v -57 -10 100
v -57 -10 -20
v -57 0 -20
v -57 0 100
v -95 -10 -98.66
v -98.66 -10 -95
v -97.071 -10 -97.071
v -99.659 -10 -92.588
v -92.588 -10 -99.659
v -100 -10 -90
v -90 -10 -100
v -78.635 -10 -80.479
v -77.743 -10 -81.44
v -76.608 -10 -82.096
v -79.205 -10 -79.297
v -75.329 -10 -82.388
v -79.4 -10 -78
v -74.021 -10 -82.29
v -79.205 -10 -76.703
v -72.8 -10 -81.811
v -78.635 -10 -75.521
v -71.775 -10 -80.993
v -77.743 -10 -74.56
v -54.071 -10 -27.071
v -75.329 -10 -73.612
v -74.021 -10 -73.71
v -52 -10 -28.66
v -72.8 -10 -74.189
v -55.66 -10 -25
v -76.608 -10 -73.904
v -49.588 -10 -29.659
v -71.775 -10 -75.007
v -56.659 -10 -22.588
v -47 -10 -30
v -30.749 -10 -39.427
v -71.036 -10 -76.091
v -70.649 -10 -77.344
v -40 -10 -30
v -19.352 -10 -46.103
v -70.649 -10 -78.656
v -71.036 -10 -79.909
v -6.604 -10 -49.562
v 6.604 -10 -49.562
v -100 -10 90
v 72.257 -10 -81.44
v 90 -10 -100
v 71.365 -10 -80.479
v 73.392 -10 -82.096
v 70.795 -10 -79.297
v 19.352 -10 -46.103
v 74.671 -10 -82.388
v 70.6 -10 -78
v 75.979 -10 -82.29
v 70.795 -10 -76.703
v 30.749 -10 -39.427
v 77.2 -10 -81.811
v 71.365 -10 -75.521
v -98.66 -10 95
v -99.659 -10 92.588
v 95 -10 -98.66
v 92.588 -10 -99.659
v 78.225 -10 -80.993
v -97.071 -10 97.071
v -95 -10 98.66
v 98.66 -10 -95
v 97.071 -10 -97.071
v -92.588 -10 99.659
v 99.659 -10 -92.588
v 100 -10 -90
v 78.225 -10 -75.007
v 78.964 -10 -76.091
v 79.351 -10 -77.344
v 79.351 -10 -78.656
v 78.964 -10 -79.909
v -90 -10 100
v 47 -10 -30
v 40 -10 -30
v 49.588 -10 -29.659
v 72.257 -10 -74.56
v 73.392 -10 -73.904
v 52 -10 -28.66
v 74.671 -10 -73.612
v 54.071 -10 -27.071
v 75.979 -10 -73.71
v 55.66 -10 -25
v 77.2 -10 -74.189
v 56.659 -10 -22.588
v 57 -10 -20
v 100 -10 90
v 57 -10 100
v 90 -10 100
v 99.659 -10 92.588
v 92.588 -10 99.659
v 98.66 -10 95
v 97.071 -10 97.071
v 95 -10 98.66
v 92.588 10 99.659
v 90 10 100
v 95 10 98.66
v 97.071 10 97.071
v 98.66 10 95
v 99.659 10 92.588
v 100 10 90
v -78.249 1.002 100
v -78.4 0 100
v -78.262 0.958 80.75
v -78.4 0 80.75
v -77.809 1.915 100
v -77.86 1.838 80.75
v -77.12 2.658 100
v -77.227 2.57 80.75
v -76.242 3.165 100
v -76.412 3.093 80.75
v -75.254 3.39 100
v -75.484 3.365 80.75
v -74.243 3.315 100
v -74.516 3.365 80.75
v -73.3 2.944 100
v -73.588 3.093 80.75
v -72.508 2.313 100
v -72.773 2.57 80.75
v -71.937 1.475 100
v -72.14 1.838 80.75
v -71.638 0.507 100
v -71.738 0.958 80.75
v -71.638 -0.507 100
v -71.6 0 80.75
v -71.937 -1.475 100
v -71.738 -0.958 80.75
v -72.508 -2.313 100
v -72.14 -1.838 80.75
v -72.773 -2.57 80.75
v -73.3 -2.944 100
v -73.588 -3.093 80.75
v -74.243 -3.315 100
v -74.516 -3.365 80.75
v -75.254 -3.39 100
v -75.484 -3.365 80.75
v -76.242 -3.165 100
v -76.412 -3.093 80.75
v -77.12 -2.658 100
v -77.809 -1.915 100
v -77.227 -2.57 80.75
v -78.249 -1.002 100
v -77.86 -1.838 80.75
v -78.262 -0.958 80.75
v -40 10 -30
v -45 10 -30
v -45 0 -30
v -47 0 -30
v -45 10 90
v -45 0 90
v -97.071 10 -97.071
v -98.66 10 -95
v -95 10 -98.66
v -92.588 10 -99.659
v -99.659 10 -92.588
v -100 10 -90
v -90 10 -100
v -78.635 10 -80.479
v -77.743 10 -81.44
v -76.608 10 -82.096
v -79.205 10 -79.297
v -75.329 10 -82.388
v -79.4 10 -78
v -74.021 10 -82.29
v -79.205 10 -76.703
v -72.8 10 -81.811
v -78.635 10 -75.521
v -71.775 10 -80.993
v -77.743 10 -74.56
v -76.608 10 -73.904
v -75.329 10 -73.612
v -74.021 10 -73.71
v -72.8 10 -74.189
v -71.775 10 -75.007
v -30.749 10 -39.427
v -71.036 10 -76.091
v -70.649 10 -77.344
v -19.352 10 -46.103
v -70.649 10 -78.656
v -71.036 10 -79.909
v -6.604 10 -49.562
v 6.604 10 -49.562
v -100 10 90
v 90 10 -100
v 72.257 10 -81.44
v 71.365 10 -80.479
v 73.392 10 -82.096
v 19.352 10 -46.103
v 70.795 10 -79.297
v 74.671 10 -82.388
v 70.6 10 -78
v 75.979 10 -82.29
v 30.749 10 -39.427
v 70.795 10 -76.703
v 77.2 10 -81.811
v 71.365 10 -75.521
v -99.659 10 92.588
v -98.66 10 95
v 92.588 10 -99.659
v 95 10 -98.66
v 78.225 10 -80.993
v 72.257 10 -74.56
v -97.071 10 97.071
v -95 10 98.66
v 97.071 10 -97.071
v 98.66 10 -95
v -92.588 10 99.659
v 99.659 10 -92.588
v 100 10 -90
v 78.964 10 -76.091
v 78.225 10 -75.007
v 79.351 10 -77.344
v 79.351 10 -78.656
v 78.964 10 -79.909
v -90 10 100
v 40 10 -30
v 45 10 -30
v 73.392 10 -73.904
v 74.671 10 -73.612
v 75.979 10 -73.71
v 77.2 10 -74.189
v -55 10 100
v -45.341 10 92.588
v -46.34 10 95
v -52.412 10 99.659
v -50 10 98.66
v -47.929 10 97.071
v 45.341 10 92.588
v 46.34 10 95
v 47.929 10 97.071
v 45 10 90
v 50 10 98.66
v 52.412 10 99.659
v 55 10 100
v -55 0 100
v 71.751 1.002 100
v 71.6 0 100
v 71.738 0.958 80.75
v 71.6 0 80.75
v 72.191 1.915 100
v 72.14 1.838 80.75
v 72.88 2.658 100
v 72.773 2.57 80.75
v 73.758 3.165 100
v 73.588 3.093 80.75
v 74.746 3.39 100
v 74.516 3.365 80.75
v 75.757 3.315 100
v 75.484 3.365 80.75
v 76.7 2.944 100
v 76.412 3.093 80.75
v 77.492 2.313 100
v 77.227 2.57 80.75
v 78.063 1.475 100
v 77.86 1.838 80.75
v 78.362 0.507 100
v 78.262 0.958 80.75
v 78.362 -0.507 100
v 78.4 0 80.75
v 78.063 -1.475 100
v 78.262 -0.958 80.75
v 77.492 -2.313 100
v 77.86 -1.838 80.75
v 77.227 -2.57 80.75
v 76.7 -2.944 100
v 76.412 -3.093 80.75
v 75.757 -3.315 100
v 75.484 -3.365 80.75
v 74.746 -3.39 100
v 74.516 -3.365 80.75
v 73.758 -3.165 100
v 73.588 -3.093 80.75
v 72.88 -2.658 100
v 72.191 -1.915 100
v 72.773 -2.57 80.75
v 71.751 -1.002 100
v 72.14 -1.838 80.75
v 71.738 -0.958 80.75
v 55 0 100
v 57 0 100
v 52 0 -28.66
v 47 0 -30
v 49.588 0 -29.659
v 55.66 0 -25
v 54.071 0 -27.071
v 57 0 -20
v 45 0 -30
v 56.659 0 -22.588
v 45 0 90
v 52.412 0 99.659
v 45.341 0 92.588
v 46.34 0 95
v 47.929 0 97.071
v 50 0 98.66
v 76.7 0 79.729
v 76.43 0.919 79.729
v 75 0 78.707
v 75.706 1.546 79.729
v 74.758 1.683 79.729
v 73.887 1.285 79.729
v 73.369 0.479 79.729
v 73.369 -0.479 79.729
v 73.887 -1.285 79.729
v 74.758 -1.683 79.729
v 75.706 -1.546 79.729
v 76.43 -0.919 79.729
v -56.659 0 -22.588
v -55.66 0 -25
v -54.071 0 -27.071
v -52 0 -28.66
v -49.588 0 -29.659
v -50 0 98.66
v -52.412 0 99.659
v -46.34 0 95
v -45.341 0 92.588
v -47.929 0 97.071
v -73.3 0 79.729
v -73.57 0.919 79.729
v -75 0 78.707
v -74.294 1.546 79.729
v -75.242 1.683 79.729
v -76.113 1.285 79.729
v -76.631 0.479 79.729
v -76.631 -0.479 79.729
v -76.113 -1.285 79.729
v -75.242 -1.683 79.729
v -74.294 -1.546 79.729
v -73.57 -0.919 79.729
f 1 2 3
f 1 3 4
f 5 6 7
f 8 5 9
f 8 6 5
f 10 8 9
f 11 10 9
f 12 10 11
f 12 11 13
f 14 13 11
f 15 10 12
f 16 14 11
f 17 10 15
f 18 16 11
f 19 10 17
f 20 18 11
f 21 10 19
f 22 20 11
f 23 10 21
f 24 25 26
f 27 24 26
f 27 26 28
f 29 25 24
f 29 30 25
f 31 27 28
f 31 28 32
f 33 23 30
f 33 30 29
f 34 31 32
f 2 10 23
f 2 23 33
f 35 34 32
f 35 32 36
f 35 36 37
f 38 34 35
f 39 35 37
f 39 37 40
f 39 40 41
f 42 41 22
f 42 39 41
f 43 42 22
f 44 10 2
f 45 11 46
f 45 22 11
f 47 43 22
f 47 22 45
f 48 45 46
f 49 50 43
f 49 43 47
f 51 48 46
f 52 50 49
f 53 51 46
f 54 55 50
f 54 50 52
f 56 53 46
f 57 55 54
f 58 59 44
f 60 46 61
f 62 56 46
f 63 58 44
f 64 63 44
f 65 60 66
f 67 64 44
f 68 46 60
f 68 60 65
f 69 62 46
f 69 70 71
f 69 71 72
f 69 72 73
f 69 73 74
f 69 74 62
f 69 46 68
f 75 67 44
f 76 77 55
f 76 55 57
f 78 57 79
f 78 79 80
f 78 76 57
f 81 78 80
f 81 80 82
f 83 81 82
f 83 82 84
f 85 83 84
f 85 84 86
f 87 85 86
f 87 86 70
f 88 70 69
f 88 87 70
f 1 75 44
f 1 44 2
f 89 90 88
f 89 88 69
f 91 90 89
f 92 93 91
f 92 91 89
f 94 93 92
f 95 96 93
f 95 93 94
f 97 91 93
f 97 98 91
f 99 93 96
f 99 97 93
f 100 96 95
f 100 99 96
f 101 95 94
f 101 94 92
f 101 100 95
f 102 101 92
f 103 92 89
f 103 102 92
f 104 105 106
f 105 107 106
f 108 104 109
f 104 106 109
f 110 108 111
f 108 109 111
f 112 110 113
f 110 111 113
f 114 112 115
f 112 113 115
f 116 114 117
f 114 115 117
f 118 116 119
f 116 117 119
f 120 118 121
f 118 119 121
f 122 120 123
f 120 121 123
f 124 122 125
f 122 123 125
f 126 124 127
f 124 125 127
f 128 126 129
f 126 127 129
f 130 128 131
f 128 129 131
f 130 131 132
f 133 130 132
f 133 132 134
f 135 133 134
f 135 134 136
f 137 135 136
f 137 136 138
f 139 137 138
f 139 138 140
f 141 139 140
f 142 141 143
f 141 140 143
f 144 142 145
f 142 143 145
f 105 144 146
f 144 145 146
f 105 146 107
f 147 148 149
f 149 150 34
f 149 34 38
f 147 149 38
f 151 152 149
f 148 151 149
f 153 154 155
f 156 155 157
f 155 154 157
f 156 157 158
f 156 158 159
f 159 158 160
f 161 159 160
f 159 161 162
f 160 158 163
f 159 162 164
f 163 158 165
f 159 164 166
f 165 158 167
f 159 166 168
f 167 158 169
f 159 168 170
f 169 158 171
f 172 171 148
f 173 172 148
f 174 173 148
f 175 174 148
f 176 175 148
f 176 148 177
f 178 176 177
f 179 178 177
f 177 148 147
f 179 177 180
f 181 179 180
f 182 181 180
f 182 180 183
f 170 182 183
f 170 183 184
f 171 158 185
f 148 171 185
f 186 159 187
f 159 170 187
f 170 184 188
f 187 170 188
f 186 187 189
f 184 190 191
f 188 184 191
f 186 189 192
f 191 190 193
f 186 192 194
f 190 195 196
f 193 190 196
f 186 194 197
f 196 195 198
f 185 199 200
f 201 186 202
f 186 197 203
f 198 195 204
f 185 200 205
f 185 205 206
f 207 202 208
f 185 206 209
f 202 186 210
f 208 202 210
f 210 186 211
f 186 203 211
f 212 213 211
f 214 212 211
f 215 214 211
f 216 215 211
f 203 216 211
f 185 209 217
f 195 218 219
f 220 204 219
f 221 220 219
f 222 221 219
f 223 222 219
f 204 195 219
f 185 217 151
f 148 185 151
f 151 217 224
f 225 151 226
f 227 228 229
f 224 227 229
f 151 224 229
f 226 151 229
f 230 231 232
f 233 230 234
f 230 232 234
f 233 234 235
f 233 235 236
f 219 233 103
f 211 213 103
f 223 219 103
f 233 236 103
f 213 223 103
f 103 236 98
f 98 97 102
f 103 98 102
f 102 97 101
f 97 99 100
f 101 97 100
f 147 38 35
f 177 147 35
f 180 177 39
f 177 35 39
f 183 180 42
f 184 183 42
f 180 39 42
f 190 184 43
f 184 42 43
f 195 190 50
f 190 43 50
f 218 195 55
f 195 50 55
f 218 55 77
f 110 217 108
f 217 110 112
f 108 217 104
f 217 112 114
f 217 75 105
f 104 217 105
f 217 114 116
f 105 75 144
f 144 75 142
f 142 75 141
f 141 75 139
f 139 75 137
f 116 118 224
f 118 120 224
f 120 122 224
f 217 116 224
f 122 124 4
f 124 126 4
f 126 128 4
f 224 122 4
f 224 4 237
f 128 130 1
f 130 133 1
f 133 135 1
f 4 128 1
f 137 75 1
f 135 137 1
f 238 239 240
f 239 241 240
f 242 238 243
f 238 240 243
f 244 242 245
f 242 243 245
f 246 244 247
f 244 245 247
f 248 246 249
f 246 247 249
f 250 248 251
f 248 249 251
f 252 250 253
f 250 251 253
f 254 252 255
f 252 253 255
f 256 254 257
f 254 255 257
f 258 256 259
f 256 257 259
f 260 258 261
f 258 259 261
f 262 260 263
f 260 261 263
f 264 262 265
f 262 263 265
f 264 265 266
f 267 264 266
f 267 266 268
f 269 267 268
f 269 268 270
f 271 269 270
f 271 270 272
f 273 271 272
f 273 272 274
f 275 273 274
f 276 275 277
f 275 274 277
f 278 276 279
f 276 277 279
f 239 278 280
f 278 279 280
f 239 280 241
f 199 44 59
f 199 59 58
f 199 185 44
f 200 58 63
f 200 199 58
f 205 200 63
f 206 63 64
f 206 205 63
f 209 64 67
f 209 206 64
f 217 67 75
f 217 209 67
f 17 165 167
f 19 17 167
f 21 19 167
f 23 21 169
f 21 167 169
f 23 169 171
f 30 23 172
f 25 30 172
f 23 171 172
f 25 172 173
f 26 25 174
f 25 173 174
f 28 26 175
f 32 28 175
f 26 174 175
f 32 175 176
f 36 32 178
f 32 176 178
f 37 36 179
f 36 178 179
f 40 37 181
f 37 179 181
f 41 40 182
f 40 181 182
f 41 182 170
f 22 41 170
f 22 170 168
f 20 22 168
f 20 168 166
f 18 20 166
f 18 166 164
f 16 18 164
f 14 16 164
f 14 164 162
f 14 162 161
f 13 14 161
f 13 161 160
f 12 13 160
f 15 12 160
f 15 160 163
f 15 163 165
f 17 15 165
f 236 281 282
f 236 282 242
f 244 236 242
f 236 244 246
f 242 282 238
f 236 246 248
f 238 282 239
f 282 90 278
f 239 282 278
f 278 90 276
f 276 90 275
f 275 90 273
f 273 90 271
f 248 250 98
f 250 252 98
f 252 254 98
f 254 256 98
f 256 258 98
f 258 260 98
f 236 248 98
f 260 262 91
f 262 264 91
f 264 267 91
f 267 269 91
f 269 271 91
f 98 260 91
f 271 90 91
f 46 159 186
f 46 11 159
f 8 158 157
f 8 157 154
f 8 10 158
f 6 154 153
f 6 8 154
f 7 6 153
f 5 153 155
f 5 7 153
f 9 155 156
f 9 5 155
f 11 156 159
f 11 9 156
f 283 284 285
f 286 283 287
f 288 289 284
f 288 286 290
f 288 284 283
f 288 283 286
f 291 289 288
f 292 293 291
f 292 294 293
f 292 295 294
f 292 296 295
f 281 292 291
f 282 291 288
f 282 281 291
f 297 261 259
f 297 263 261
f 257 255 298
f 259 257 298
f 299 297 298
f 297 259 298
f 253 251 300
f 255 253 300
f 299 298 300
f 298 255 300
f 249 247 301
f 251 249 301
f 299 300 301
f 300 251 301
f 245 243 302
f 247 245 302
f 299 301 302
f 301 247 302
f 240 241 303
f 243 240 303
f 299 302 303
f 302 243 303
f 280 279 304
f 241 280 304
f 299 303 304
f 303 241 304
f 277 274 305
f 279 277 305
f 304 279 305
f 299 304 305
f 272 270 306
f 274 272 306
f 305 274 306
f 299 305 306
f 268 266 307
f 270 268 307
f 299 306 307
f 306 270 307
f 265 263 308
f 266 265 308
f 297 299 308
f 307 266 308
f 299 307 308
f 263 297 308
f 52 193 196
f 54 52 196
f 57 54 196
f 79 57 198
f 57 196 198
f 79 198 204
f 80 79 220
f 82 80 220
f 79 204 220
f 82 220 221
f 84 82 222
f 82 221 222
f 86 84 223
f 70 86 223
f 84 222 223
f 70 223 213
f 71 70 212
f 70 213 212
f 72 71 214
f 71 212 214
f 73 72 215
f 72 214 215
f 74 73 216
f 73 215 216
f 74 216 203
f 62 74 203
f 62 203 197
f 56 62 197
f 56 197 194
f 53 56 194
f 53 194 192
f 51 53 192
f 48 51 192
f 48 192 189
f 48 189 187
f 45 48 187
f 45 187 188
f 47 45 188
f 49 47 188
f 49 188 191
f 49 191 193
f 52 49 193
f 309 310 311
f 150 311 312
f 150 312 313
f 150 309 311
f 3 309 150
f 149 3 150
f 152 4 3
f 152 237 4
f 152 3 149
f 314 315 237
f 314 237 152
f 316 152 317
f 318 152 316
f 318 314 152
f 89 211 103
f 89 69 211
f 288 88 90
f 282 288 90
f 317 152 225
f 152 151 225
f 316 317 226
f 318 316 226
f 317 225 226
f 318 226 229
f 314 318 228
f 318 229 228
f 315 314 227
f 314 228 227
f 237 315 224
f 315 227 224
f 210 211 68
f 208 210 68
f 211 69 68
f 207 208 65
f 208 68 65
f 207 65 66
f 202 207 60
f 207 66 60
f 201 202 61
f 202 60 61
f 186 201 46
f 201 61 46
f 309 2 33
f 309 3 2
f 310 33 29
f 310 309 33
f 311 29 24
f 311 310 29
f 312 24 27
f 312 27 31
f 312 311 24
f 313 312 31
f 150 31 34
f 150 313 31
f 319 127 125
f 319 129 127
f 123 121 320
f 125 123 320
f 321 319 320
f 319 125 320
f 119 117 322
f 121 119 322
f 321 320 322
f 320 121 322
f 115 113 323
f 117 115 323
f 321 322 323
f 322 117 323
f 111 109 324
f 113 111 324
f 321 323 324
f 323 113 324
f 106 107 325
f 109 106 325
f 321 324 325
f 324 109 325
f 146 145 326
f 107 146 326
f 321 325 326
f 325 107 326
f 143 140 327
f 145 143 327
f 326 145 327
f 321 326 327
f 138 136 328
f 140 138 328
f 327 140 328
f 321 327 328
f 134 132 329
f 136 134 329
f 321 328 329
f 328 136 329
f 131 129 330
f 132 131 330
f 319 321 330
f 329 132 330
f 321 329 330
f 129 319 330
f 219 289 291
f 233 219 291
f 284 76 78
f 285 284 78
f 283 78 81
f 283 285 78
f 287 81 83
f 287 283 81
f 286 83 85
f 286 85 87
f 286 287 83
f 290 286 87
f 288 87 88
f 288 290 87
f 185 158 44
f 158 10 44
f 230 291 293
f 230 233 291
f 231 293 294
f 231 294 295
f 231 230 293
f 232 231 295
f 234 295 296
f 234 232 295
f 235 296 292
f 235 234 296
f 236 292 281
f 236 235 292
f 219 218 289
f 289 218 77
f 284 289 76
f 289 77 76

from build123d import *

# Parameters (mm, degrees)
F0_W      = 200
F0_H      = 200
F1_DEPTH  = 10
F2_R      = 15
F3_DEPTH  = 20.001
F5_D      = 8.8
F7_DEPTH  = 20.001
F8_W      = 12
F8_H      = 130
F9_DEPTH  = 10
F10_R     = 10
F13_D     = 6.8
F13_DEPTH = 19.25
F13_TIP   = 2.0429261047


# Not quite as in the source:
# - two fillets or chamfers of one size are made in one step
# - a feature names something its author has since deleted; it is built from what else it names


with BuildPart() as f1:
    # F0 (on Front) → F1 (new body, symmetric)
    with BuildSketch(Plane.XZ):
        Rectangle(F0_W, F0_H)
    extrude(amount=F1_DEPTH, both=True)

    # F2 (on face) → F3 (cut, through all)
    with BuildSketch(Plane.XZ.offset(10)):
        Circle(F2_R)
    extrude(amount=-F3_DEPTH, mode=Mode.SUBTRACT)

    # F5 (through all)
    with Locations(Plane.XZ.offset(10)):
        with Locations((-75, -78), (75, -78)):
            Hole(F5_D / 2)

    # F6 (on face) → F7 (cut, through all)
    with BuildSketch(Plane.XZ.offset(10)):
        with BuildLine():
            Line((45, 100), (-45, 100))
            Line((-45, 100), (-45, -30))
            Line((-45, -30), (-40, -30))
            ThreePointArc((-40, -30), (0, -50), (40, -30))
            Line((40, -30), (45, -30))
            Line((45, -30), (45, 100))
        make_face()
    extrude(amount=-F7_DEPTH, mode=Mode.SUBTRACT)

    # F8 (on face) → F9 (cut)
    with BuildSketch(Plane.XZ.offset(10)):
        with Locations((-51, 35)):
            Rectangle(F8_W, F8_H)
        with Locations((51, 35)):
            Rectangle(F8_W, F8_H)
    extrude(amount=-F9_DEPTH, mode=Mode.SUBTRACT)

    # F10
    f10_edges = [f1.edges().sort_by_distance(p)[0] for p in [
        (-100, 0, 100),
        (-45, 5, 100),
        (45, 5, 100),
        (100, 0, 100),
        (100, 0, -100),
        (-100, 0, -100),
        (-57, -5, -30),
        (57, -5, -30),
    ]]
    fillet(f10_edges, radius=F10_R)

    # F13
    with Locations(Plane.XY.offset(100)):
        with Locations((-75, 0), (75, 0)):
            Hole(F13_D / 2, depth=F13_DEPTH)
            with Locations((0, 0, -(F13_DEPTH + F13_TIP / 2))):  # 118° drill point
                Cone(0, F13_D / 2, F13_TIP, mode=Mode.SUBTRACT)


solid = f1.part
